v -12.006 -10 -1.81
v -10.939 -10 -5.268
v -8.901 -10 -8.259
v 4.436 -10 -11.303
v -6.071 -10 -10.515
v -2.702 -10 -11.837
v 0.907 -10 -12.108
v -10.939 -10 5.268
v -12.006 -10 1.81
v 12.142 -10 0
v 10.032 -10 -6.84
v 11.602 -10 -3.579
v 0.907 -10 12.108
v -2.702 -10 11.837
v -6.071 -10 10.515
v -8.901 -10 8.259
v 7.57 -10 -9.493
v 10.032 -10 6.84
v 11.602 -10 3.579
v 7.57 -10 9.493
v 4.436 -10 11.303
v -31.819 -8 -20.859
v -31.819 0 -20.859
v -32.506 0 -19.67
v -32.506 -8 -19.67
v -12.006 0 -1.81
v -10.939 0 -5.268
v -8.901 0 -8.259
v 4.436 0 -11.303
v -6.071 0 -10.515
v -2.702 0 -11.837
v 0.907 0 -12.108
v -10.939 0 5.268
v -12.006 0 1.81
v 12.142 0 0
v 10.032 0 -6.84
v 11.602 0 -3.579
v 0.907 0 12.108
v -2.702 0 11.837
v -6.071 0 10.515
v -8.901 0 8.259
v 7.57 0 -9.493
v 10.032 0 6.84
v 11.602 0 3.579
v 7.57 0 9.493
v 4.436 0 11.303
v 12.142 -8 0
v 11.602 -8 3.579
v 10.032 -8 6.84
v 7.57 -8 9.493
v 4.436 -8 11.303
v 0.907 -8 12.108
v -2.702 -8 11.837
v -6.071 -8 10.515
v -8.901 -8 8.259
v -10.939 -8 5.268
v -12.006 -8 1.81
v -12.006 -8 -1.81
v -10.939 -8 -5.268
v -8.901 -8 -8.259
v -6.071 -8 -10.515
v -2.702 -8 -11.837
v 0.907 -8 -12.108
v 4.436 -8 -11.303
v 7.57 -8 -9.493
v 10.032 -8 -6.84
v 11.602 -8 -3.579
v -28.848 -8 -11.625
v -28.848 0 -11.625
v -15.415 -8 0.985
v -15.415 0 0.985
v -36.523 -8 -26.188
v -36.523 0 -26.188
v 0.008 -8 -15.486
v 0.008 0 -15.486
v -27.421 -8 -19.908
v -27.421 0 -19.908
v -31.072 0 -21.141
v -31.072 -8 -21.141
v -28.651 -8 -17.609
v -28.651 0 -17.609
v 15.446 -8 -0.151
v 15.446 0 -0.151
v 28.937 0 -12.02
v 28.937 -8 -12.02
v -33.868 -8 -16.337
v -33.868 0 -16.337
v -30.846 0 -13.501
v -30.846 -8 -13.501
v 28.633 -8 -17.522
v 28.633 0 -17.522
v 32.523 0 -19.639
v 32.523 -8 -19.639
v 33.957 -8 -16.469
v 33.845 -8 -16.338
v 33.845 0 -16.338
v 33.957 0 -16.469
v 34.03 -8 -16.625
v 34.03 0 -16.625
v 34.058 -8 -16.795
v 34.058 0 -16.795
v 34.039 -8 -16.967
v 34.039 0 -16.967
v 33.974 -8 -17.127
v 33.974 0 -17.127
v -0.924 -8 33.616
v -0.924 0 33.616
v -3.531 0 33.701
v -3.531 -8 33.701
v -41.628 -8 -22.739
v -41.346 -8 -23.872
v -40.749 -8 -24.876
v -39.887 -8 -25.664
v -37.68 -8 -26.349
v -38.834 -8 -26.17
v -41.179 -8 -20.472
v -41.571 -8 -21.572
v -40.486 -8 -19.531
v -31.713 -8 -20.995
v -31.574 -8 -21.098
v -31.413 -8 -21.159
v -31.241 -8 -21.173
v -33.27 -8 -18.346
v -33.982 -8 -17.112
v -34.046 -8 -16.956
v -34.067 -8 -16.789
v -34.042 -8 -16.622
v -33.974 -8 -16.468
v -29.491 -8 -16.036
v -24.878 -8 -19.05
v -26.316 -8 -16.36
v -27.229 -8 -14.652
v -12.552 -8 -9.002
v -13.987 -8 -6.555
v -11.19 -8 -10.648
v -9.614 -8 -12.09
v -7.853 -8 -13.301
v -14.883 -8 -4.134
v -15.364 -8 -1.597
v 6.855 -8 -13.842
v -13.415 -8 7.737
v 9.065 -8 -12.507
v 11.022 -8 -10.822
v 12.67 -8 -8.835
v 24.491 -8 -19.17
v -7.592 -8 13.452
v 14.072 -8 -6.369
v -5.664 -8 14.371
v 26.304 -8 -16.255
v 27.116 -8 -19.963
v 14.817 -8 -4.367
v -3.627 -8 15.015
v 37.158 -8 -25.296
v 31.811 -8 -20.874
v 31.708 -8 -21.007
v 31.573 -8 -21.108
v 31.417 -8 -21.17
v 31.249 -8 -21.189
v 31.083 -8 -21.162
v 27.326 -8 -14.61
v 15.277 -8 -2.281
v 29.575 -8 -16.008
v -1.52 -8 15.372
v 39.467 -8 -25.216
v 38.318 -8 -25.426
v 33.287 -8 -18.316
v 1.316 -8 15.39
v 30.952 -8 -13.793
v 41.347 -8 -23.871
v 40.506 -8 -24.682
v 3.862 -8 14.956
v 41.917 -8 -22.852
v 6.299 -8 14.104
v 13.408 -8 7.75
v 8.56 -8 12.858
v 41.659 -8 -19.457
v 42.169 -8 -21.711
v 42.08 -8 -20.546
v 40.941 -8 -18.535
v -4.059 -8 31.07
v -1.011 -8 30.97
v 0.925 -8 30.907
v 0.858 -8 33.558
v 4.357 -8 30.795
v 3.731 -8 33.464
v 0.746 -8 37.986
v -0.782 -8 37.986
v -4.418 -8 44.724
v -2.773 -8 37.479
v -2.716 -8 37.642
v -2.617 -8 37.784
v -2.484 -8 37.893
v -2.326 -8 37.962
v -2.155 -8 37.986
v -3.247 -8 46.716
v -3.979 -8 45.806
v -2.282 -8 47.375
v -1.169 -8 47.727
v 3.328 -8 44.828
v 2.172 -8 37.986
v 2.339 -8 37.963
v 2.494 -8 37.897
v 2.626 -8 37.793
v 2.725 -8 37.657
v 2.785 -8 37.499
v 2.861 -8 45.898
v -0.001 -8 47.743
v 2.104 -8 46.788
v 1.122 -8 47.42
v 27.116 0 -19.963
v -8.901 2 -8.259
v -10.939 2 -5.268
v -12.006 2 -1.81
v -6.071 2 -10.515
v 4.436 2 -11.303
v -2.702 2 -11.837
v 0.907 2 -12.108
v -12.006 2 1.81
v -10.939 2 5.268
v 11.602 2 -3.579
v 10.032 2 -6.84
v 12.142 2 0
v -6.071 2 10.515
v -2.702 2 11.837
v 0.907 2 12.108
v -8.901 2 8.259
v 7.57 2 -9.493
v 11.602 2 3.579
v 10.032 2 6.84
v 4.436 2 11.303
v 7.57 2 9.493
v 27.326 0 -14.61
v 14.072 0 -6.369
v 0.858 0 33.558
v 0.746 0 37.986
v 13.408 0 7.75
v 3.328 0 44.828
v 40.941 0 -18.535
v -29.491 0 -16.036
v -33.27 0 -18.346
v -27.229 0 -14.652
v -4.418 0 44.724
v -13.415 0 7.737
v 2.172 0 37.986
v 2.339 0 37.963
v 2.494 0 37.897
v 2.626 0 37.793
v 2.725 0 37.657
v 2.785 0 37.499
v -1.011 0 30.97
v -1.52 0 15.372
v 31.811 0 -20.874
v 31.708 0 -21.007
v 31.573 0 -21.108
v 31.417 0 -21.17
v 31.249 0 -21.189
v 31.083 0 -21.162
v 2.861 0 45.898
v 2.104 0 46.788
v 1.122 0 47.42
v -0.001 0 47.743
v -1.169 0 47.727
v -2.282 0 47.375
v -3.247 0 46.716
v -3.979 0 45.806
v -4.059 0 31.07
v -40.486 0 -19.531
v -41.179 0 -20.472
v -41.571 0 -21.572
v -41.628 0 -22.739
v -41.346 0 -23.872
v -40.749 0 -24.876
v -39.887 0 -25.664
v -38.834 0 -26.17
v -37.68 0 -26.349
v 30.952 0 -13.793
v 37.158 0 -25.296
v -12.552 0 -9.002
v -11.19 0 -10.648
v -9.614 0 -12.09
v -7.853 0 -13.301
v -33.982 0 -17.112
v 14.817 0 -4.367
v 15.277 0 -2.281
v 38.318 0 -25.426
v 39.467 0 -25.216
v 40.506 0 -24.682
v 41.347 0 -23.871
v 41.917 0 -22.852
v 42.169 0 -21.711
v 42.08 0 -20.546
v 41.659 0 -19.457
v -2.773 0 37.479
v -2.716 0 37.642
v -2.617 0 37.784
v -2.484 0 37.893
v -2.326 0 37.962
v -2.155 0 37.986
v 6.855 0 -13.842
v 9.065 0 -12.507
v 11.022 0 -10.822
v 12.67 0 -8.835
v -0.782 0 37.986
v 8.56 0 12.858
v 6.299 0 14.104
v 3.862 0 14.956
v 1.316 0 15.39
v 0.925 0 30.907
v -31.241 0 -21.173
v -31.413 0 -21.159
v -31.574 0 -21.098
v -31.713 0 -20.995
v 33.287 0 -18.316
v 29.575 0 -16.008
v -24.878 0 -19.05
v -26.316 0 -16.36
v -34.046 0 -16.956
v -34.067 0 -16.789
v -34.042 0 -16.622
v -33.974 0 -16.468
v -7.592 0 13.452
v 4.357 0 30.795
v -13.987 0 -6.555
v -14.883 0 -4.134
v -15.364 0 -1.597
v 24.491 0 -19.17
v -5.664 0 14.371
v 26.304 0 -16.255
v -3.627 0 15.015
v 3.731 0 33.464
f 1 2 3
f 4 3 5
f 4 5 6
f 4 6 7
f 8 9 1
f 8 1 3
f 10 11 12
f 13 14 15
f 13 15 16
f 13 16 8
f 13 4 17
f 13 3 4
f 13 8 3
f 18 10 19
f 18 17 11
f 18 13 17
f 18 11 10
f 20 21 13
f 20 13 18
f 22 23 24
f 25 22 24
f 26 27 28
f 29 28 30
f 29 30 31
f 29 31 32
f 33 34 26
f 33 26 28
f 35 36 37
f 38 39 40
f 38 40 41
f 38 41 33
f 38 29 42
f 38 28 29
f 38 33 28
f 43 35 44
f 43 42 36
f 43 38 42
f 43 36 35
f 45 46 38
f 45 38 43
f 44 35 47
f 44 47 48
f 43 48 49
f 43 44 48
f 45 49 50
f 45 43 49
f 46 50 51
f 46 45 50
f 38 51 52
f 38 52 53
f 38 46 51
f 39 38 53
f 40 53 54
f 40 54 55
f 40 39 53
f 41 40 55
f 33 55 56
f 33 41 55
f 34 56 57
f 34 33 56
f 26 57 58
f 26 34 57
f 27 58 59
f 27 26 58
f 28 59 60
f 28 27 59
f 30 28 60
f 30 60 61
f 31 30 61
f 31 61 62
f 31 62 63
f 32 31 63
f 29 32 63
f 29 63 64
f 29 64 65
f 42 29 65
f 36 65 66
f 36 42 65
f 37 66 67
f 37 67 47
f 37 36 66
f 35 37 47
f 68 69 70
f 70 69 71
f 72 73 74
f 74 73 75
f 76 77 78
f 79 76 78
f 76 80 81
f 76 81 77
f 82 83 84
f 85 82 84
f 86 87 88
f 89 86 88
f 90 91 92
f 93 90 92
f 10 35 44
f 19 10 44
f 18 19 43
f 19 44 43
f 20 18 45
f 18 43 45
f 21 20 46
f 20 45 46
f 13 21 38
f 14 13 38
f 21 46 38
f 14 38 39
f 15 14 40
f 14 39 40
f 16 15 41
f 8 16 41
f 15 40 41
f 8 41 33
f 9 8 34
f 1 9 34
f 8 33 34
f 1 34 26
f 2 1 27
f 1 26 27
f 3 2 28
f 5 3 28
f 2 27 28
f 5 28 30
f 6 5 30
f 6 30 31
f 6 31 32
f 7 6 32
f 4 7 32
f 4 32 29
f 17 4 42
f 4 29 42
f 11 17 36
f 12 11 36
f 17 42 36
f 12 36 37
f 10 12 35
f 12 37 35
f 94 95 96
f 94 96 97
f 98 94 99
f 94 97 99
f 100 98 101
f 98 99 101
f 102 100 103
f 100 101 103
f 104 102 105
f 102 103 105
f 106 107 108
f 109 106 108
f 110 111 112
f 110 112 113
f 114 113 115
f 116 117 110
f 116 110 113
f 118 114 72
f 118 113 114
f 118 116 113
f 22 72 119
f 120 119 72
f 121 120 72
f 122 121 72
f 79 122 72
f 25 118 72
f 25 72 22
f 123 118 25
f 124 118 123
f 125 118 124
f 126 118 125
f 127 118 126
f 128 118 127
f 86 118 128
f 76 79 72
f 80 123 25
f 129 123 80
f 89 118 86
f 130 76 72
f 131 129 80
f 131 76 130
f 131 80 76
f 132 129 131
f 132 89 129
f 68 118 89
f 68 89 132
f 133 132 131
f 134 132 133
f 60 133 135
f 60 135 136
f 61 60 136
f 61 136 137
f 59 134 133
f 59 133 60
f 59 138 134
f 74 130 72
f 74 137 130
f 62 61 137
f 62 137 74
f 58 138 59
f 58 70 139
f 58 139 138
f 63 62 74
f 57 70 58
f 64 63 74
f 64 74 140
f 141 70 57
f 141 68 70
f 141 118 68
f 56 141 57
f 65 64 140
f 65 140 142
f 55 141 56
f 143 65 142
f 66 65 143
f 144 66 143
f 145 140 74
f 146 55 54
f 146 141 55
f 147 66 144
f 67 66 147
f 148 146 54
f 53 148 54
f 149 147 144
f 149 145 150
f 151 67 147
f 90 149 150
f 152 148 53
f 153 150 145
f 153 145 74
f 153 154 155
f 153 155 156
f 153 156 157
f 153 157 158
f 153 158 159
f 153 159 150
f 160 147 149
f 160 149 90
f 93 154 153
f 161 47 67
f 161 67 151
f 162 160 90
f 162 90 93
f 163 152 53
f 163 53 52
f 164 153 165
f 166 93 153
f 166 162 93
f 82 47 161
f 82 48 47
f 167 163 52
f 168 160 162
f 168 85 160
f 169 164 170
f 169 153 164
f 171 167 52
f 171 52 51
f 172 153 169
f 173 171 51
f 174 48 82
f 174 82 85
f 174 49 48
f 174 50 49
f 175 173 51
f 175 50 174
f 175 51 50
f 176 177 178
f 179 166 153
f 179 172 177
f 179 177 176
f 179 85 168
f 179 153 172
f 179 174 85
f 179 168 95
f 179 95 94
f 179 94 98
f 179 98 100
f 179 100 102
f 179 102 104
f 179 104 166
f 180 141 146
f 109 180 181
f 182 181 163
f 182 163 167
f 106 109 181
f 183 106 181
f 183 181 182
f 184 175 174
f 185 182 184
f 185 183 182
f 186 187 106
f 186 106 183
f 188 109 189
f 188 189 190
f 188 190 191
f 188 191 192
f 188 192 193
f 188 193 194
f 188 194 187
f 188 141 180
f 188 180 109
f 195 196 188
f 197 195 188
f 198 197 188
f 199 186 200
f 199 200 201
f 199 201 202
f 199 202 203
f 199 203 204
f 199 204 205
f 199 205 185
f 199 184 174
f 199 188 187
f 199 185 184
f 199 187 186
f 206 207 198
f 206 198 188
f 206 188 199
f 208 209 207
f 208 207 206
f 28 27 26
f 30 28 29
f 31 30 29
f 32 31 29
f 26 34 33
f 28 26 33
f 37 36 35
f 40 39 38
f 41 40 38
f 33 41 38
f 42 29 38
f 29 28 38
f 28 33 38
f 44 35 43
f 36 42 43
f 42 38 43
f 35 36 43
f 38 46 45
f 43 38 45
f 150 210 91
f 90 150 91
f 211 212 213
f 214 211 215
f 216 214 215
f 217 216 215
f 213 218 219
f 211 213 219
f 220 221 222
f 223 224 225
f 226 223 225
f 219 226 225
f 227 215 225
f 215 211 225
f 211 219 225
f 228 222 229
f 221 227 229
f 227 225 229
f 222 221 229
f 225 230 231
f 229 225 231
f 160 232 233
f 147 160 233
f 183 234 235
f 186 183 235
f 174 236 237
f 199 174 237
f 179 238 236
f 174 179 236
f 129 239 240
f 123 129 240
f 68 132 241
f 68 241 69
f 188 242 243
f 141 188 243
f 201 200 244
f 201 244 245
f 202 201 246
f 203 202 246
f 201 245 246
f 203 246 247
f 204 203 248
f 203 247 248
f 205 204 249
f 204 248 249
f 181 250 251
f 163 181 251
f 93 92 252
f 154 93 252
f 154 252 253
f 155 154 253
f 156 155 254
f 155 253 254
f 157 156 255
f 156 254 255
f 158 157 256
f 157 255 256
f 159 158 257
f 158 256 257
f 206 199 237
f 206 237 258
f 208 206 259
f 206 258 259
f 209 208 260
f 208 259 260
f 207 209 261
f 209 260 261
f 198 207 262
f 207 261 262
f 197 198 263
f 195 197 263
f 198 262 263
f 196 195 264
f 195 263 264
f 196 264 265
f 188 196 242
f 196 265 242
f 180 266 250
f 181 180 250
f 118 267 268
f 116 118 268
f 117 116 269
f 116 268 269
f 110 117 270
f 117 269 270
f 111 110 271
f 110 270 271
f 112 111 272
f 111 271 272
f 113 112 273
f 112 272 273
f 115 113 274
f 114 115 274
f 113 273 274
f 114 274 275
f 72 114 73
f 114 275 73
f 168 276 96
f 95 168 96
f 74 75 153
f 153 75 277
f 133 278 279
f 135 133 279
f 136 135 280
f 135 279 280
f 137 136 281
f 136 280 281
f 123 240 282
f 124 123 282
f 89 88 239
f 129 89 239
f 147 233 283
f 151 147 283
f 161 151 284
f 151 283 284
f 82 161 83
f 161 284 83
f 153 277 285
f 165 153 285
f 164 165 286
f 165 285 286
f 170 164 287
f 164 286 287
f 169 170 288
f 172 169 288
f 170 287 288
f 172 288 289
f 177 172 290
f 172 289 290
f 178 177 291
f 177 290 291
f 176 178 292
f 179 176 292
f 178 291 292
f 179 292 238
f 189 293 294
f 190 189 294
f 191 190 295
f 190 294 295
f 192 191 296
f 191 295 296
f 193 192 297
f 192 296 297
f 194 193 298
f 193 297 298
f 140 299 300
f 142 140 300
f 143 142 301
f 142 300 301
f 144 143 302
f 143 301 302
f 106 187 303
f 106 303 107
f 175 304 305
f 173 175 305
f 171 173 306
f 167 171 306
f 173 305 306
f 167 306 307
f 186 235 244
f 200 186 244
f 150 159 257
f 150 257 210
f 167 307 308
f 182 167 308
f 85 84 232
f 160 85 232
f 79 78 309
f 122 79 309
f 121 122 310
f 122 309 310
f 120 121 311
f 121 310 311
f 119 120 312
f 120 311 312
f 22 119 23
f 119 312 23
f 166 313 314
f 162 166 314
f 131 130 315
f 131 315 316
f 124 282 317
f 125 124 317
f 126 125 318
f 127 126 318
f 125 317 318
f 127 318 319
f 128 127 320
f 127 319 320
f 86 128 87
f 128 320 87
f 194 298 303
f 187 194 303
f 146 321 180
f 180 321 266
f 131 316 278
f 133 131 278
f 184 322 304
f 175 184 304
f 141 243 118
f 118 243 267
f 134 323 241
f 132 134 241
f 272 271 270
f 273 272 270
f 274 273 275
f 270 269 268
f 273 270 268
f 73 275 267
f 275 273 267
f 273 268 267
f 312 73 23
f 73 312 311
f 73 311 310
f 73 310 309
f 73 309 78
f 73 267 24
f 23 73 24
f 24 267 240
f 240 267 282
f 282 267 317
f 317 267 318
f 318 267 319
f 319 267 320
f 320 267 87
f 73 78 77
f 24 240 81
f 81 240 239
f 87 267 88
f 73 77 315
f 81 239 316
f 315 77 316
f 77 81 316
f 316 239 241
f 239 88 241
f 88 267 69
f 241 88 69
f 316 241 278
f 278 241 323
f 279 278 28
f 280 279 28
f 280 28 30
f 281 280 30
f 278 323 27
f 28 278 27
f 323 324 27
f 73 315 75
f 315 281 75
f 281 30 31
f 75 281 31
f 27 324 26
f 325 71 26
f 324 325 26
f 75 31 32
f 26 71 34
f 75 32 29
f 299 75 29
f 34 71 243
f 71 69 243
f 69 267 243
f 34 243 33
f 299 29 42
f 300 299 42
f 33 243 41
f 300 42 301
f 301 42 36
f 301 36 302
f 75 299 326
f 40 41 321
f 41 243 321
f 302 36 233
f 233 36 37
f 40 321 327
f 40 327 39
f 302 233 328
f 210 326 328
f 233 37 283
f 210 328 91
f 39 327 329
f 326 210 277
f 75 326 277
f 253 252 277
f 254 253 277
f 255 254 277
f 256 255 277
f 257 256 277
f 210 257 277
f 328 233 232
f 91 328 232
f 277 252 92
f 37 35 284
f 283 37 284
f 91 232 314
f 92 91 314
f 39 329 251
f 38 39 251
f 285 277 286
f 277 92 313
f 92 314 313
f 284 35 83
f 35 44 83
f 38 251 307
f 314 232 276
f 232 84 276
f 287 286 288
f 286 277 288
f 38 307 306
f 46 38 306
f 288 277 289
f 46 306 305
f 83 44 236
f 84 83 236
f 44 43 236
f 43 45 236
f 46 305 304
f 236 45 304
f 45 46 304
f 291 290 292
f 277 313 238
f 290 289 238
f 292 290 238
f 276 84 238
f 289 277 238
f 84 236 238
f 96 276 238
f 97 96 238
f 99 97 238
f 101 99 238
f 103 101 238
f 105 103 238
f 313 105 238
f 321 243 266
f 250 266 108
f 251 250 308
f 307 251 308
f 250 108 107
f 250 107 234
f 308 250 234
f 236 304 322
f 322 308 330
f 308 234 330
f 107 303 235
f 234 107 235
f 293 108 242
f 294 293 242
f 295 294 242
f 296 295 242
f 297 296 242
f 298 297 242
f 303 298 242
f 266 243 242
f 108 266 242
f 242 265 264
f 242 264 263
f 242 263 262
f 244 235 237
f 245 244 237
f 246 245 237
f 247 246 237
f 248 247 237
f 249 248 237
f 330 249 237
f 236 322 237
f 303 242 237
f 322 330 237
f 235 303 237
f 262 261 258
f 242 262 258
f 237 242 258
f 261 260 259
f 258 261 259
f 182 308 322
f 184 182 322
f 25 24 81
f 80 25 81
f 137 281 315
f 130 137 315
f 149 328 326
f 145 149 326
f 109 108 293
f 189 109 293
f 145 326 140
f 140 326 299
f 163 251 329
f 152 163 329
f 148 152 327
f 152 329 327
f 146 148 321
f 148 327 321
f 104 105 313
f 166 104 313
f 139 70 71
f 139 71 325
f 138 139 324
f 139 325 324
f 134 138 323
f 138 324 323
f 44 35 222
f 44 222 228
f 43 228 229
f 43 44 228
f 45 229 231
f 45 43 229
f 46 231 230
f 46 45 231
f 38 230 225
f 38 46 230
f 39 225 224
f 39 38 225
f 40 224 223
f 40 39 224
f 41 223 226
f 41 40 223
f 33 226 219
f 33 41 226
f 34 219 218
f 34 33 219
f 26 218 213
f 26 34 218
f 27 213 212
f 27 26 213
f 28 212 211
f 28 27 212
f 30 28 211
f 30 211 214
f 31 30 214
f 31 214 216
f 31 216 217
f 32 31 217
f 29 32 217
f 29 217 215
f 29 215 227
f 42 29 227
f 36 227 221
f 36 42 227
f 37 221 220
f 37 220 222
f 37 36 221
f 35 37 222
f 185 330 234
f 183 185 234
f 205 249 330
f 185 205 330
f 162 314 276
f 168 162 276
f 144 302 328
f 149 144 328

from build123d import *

# Parameters (mm, degrees)
F0_R     = 12.1418390121
F1_DEPTH = 8
F2_DEPTH = 2
F3_DEPTH = 10


with BuildPart() as f1:
    # F0 (on Front) → F1 (new body)
    with BuildSketch(Plane.XZ):
        with BuildLine():
            ThreePointArc((13.4494333026, 7.5968233332), (14.9390037013, 3.9274863881), (15.4466495046, 0))
            ThreePointArc((15.4466495046, 0), (15.4464658378, -0.0753262184), (15.4459148418, -0.1506506455))
            Line((15.4459148418, -0.1506506455), (28.9365164109, -12.0200237039))
            Line((28.9365164109, -12.0200237039), (30.9517174769, -13.7930486589))
            Line((30.9517174769, -13.7930486589), (33.8445656343, -16.338249761))
            ThreePointArc((33.8445656343, -16.338249761), (34.0502262206, -16.7093721334), (33.9741020568, -17.1267846437))
            Line((33.9741020568, -17.1267846437), (33.287475865, -18.3160560936))
            Line((33.287475865, -18.3160560936), (32.5234499077, -19.63938787))
            Line((32.5234499077, -19.63938787), (31.8108983077, -20.8735634443))
            ThreePointArc((31.8108983077, -20.8735634443), (31.4969505806, -21.1445308611), (31.0825994105, -21.1618405147))
            Line((31.0825994105, -21.1618405147), (27.1155061195, -19.9633145088))
            Line((27.1155061195, -19.9633145088), (24.4909505049, -19.1703918504))
            Line((24.4909505049, -19.1703918504), (6.8549746085, -13.8422651338))
            ThreePointArc((6.8549746085, -13.8422651338), (3.5909934423, -15.0234399195), (0.1456746567, -15.4459625732))
            Line((0.1456746567, -15.4459625732), (0.0075583308, -15.4864247412))
            Line((0.0075583308, -15.4864247412), (37.1577128338, -25.2961649207))
            ThreePointArc((37.1577128338, -25.2961649207), (41.6695443761, -23.3820930381), (40.9410356224, -18.535489069))
            Line((40.9410356224, -18.535489069), (13.4078580743, 7.7497580771))
            Line((13.4078580743, 7.7497580771), (13.4494333026, 7.5968233332))
        make_face()
        with BuildLine():
            ThreePointArc((13.3037586459, 7.8491392399), (13.3771908743, 7.7233247523), (13.4494333026, 7.5968233332))
            Line((13.4494333026, 7.5968233332), (13.4078580743, 7.7497580771))
            Line((13.4078580743, 7.7497580771), (13.3037586459, 7.8491392399))
        make_face()
        with BuildLine():
            ThreePointArc((8.5602659475, 12.8577147202), (11.2151839013, 10.6216115056), (13.3037586459, 7.8491392399))
            Line((13.3037586459, 7.8491392399), (13.4078580743, 7.7497580771))
            Line((13.4078580743, 7.7497580771), (3.3282650227, 44.8276057209))
            ThreePointArc((3.3282650227, 44.8276057209), (-0.5852856234, 47.7779305128), (-4.4183134059, 44.7237214407))
            Line((-4.4183134059, 44.7237214407), (-13.4154164051, 7.7366666641))
            Line((-13.4154164051, 7.7366666641), (-13.3037586459, 7.8491392399))
            ThreePointArc((-13.3037586459, 7.8491392399), (-10.8171613269, 11.0266949602), (-7.5924901348, 13.4518799604))
            Line((-7.5924901348, 13.4518799604), (-4.0586123238, 31.0697701608))
            Line((-4.0586123238, 31.0697701608), (-3.5307282042, 33.7014979552))
            Line((-3.5307282042, 33.7014979552), (-2.7729434708, 37.4793784999))
            ThreePointArc((-2.7729434708, 37.4793784999), (-2.5543723614, 37.8430469783), (-2.1548204418, 37.9858277738))
            Line((-2.1548204418, 37.9858277738), (-0.7815680583, 37.9858277738))
            Line((-0.7815680583, 37.9858277738), (0.7464838564, 37.9858277738))
            Line((0.7464838564, 37.9858277738), (2.1715870564, 37.9858277738))
            ThreePointArc((2.1715870564, 37.9858277738), (2.5632255865, 37.8494247751), (2.7853917713, 37.4992409625))
            Line((2.7853917713, 37.4992409625), (3.7309844486, 33.4643743904))
            Line((3.7309844486, 33.4643743904), (4.3565710905, 30.7949812253))
            Line((4.3565710905, 30.7949812253), (8.5602659475, 12.8577147202))
        make_face()
        with BuildLine():
            Line((-13.3037586459, 7.8491392399), (-13.4154164051, 7.7366666641))
            Line((-13.4154164051, 7.7366666641), (-13.4494333026, 7.5968233332))
            ThreePointArc((-13.4494333026, 7.5968233332), (-13.3771908743, 7.7233247523), (-13.3037586459, 7.8491392399))
        make_face()
        with BuildLine():
            Line((-13.4494333026, 7.5968233332), (-13.4154164051, 7.7366666641))
            Line((-13.4154164051, 7.7366666641), (-40.4859778565, -19.5314408002))
            ThreePointArc((-40.4859778565, -19.5314408002), (-41.0842587527, -24.3958374747), (-36.5227222165, -26.1882323718))
            Line((-36.5227222165, -26.1882323718), (0.0075583308, -15.4864247412))
            Line((0.0075583308, -15.4864247412), (-0.1456746567, -15.4459625732))
            ThreePointArc((-0.1456746567, -15.4459625732), (-4.1408172919, -14.881283986), (-7.853424707, -13.3012293149))
            Line((-7.853424707, -13.3012293149), (-24.8779040871, -19.0497464569))
            Line((-24.8779040871, -19.0497464569), (-27.4209892727, -19.9084492963))
            Line((-27.4209892727, -19.9084492963), (-31.0716221636, -21.1411287389))
            ThreePointArc((-31.0716221636, -21.1411287389), (-31.4958538591, -21.1336748449), (-31.819281615, -20.8590431301))
            Line((-31.819281615, -20.8590431301), (-32.5059078068, -19.6697716802))
            Line((-32.5059078068, -19.6697716802), (-33.2699337641, -18.3464399038))
            Line((-33.2699337641, -18.3464399038), (-33.9824853641, -17.1122643295))
            ThreePointArc((-33.9824853641, -17.1122643295), (-34.0601761671, -16.704893914), (-33.8679911818, -16.3374004478))
            Line((-33.8679911818, -16.3374004478), (-30.8464905681, -13.5010598816))
            Line((-30.8464905681, -13.5010598816), (-28.8475215954, -11.6245893748))
            Line((-28.8475215954, -11.6245893748), (-15.415240556, 0.9845504136))
            ThreePointArc((-15.415240556, 0.9845504136), (-14.8061773437, 4.4018284139), (-13.4494333026, 7.5968233332))
        make_face()
        with BuildLine():
            Line((-0.1456746567, -15.4459625732), (0.0075583308, -15.4864247412))
            Line((0.0075583308, -15.4864247412), (0.1456746567, -15.4459625732))
            ThreePointArc((0.1456746567, -15.4459625732), (0, -15.4466495046), (-0.1456746567, -15.4459625732))
        make_face()
        Polygon((-28.6505205455, -17.6086149121), (-29.4913038382, -16.0359324036), (-33.2699337641, -18.3464399038), (-32.5059078068, -19.6697716802), align=None)
        Polygon((-26.3156893084, -16.360373716), (-27.2287665842, -14.6524655394), (-29.4913038382, -16.0359324036), (-28.6505205455, -17.6086149121), align=None)
        with BuildLine():
            ThreePointArc((-12.552260982, -9.0022066826), (-13.3257357106, -7.8117698819), (-13.9866503322, -6.5553484576))
            Line((-13.9866503322, -6.5553484576), (-27.2287665842, -14.6524655394))
            Line((-27.2287665842, -14.6524655394), (-26.3156893084, -16.360373716))
            Line((-26.3156893084, -16.360373716), (-12.552260982, -9.0022066826))
        make_face()
        with BuildLine():
            ThreePointArc((15.4459148418, -0.1506506455), (15.4464658378, -0.0753262184), (15.4466495046, 0))
            ThreePointArc((15.4466495046, 0), (14.9390037013, 3.9274863881), (13.4494333026, 7.5968233332))
            ThreePointArc((13.4494333026, 7.5968233332), (13.3771908743, 7.7233247523), (13.3037586459, 7.8491392399))
            ThreePointArc((13.3037586459, 7.8491392399), (11.2151839013, 10.6216115056), (8.5602659475, 12.8577147202))
            ThreePointArc((8.5602659475, 12.8577147202), (5.0980376929, 14.5811176732), (1.3162268711, 15.3904687304))
            ThreePointArc((1.3162268711, 15.3904687304), (-0.1023233109, 15.4463105905), (-1.5200091862, 15.3716802267))
            ThreePointArc((-1.5200091862, 15.3716802267), (-4.6562666627, 14.7281418272), (-7.5924901348, 13.4518799604))
            ThreePointArc((-7.5924901348, 13.4518799604), (-10.8171613269, 11.0266949602), (-13.3037586459, 7.8491392399))
            ThreePointArc((-13.3037586459, 7.8491392399), (-13.3771908743, 7.7233247523), (-13.4494333026, 7.5968233332))
            ThreePointArc((-13.4494333026, 7.5968233332), (-14.8061773437, 4.4018284139), (-15.415240556, 0.9845504136))
            ThreePointArc((-15.415240556, 0.9845504136), (-15.176637167, -2.8755286851), (-13.9866503322, -6.5553484576))
            ThreePointArc((-13.9866503322, -6.5553484576), (-13.3257357106, -7.8117698819), (-12.552260982, -9.0022066826))
            ThreePointArc((-12.552260982, -9.0022066826), (-10.4268116415, -11.3965161303), (-7.853424707, -13.3012293149))
            ThreePointArc((-7.853424707, -13.3012293149), (-4.1408172919, -14.881283986), (-0.1456746567, -15.4459625732))
            ThreePointArc((-0.1456746567, -15.4459625732), (0, -15.4466495046), (0.1456746567, -15.4459625732))
            ThreePointArc((0.1456746567, -15.4459625732), (3.5909934423, -15.0234399195), (6.8549746085, -13.8422651338))
            ThreePointArc((6.8549746085, -13.8422651338), (10.0785994741, -11.7055889881), (12.6704234611, -8.8351202727))
            ThreePointArc((12.6704234611, -8.8351202727), (13.4280590215, -7.6345407086), (14.0722701682, -6.3694735441))
            ThreePointArc((14.0722701682, -6.3694735441), (15.0830783043, -3.3316256969), (15.4459148418, -0.1506506455))
        make_face()
        Circle(F0_R, mode=Mode.SUBTRACT)
        Polygon((-0.9242475666, 33.6163860801), (0.8581270842, 33.5581845165), (0.7464838564, 37.9858277738), (-0.7815680583, 37.9858277738), align=None)
        Polygon((-1.0106545992, 30.9702423172), (0.9249759069, 30.9070363453), (0.8581270842, 33.5581845165), (-0.9242475666, 33.6163860801), align=None)
        with BuildLine():
            ThreePointArc((-1.5200091862, 15.3716802267), (-0.1023233109, 15.4463105905), (1.3162268711, 15.3904687304))
            Line((1.3162268711, 15.3904687304), (0.9249759069, 30.9070363453))
            Line((0.9249759069, 30.9070363453), (-1.0106545992, 30.9702423172))
            Line((-1.0106545992, 30.9702423172), (-1.5200091862, 15.3716802267))
        make_face()
        Polygon((33.287475865, -18.3160560936), (29.5747681121, -16.007771168), (28.633176754, -17.5222521128), (32.5234499077, -19.63938787), align=None)
        Polygon((29.5747681121, -16.007771168), (27.3263439077, -14.6098686012), (26.3037906773, -16.254570806), (28.633176754, -17.5222521128), align=None)
        with BuildLine():
            Line((27.3263439077, -14.6098686012), (14.0722701682, -6.3694735441))
            ThreePointArc((14.0722701682, -6.3694735441), (13.4280590215, -7.6345407086), (12.6704234611, -8.8351202727))
            Line((12.6704234611, -8.8351202727), (26.3037906773, -16.254570806))
            Line((26.3037906773, -16.254570806), (27.3263439077, -14.6098686012))
        make_face()
        Polygon((0.9249759069, 30.9070363453), (4.3565710905, 30.7949812253), (3.7309844486, 33.4643743904), (0.8581270842, 33.5581845165), align=None)
        Polygon((-4.0586123238, 31.0697701608), (-1.0106545992, 30.9702423172), (-0.9242475666, 33.6163860801), (-3.5307282042, 33.7014979552), align=None)
        Polygon((-27.2287665842, -14.6524655394), (-28.8475215954, -11.6245893748), (-30.8464905681, -13.5010598816), (-29.4913038382, -16.0359324036), align=None)
        Polygon((-27.4209892727, -19.9084492963), (-24.8779040871, -19.0497464569), (-26.3156893084, -16.360373716), (-28.6505205455, -17.6086149121), align=None)
        Polygon((30.9517174769, -13.7930486589), (28.9365164109, -12.0200237039), (27.3263439077, -14.6098686012), (29.5747681121, -16.007771168), align=None)
        Polygon((28.633176754, -17.5222521128), (26.3037906773, -16.254570806), (24.4909505049, -19.1703918504), (27.1155061195, -19.9633145088), align=None)
    extrude(amount=F1_DEPTH)


with BuildPart() as f2:
    # F0 (on Front) → F2 (new body)
    with BuildSketch(Plane.XZ):
        Circle(F0_R)
    extrude(amount=-F2_DEPTH)


with BuildPart() as f3:
    # F0 (on Front) → F3 (new body)
    with BuildSketch(Plane.XZ):
        Circle(F0_R)
    extrude(amount=F3_DEPTH)


solid = Compound([f1.part, f2.part, f3.part])
